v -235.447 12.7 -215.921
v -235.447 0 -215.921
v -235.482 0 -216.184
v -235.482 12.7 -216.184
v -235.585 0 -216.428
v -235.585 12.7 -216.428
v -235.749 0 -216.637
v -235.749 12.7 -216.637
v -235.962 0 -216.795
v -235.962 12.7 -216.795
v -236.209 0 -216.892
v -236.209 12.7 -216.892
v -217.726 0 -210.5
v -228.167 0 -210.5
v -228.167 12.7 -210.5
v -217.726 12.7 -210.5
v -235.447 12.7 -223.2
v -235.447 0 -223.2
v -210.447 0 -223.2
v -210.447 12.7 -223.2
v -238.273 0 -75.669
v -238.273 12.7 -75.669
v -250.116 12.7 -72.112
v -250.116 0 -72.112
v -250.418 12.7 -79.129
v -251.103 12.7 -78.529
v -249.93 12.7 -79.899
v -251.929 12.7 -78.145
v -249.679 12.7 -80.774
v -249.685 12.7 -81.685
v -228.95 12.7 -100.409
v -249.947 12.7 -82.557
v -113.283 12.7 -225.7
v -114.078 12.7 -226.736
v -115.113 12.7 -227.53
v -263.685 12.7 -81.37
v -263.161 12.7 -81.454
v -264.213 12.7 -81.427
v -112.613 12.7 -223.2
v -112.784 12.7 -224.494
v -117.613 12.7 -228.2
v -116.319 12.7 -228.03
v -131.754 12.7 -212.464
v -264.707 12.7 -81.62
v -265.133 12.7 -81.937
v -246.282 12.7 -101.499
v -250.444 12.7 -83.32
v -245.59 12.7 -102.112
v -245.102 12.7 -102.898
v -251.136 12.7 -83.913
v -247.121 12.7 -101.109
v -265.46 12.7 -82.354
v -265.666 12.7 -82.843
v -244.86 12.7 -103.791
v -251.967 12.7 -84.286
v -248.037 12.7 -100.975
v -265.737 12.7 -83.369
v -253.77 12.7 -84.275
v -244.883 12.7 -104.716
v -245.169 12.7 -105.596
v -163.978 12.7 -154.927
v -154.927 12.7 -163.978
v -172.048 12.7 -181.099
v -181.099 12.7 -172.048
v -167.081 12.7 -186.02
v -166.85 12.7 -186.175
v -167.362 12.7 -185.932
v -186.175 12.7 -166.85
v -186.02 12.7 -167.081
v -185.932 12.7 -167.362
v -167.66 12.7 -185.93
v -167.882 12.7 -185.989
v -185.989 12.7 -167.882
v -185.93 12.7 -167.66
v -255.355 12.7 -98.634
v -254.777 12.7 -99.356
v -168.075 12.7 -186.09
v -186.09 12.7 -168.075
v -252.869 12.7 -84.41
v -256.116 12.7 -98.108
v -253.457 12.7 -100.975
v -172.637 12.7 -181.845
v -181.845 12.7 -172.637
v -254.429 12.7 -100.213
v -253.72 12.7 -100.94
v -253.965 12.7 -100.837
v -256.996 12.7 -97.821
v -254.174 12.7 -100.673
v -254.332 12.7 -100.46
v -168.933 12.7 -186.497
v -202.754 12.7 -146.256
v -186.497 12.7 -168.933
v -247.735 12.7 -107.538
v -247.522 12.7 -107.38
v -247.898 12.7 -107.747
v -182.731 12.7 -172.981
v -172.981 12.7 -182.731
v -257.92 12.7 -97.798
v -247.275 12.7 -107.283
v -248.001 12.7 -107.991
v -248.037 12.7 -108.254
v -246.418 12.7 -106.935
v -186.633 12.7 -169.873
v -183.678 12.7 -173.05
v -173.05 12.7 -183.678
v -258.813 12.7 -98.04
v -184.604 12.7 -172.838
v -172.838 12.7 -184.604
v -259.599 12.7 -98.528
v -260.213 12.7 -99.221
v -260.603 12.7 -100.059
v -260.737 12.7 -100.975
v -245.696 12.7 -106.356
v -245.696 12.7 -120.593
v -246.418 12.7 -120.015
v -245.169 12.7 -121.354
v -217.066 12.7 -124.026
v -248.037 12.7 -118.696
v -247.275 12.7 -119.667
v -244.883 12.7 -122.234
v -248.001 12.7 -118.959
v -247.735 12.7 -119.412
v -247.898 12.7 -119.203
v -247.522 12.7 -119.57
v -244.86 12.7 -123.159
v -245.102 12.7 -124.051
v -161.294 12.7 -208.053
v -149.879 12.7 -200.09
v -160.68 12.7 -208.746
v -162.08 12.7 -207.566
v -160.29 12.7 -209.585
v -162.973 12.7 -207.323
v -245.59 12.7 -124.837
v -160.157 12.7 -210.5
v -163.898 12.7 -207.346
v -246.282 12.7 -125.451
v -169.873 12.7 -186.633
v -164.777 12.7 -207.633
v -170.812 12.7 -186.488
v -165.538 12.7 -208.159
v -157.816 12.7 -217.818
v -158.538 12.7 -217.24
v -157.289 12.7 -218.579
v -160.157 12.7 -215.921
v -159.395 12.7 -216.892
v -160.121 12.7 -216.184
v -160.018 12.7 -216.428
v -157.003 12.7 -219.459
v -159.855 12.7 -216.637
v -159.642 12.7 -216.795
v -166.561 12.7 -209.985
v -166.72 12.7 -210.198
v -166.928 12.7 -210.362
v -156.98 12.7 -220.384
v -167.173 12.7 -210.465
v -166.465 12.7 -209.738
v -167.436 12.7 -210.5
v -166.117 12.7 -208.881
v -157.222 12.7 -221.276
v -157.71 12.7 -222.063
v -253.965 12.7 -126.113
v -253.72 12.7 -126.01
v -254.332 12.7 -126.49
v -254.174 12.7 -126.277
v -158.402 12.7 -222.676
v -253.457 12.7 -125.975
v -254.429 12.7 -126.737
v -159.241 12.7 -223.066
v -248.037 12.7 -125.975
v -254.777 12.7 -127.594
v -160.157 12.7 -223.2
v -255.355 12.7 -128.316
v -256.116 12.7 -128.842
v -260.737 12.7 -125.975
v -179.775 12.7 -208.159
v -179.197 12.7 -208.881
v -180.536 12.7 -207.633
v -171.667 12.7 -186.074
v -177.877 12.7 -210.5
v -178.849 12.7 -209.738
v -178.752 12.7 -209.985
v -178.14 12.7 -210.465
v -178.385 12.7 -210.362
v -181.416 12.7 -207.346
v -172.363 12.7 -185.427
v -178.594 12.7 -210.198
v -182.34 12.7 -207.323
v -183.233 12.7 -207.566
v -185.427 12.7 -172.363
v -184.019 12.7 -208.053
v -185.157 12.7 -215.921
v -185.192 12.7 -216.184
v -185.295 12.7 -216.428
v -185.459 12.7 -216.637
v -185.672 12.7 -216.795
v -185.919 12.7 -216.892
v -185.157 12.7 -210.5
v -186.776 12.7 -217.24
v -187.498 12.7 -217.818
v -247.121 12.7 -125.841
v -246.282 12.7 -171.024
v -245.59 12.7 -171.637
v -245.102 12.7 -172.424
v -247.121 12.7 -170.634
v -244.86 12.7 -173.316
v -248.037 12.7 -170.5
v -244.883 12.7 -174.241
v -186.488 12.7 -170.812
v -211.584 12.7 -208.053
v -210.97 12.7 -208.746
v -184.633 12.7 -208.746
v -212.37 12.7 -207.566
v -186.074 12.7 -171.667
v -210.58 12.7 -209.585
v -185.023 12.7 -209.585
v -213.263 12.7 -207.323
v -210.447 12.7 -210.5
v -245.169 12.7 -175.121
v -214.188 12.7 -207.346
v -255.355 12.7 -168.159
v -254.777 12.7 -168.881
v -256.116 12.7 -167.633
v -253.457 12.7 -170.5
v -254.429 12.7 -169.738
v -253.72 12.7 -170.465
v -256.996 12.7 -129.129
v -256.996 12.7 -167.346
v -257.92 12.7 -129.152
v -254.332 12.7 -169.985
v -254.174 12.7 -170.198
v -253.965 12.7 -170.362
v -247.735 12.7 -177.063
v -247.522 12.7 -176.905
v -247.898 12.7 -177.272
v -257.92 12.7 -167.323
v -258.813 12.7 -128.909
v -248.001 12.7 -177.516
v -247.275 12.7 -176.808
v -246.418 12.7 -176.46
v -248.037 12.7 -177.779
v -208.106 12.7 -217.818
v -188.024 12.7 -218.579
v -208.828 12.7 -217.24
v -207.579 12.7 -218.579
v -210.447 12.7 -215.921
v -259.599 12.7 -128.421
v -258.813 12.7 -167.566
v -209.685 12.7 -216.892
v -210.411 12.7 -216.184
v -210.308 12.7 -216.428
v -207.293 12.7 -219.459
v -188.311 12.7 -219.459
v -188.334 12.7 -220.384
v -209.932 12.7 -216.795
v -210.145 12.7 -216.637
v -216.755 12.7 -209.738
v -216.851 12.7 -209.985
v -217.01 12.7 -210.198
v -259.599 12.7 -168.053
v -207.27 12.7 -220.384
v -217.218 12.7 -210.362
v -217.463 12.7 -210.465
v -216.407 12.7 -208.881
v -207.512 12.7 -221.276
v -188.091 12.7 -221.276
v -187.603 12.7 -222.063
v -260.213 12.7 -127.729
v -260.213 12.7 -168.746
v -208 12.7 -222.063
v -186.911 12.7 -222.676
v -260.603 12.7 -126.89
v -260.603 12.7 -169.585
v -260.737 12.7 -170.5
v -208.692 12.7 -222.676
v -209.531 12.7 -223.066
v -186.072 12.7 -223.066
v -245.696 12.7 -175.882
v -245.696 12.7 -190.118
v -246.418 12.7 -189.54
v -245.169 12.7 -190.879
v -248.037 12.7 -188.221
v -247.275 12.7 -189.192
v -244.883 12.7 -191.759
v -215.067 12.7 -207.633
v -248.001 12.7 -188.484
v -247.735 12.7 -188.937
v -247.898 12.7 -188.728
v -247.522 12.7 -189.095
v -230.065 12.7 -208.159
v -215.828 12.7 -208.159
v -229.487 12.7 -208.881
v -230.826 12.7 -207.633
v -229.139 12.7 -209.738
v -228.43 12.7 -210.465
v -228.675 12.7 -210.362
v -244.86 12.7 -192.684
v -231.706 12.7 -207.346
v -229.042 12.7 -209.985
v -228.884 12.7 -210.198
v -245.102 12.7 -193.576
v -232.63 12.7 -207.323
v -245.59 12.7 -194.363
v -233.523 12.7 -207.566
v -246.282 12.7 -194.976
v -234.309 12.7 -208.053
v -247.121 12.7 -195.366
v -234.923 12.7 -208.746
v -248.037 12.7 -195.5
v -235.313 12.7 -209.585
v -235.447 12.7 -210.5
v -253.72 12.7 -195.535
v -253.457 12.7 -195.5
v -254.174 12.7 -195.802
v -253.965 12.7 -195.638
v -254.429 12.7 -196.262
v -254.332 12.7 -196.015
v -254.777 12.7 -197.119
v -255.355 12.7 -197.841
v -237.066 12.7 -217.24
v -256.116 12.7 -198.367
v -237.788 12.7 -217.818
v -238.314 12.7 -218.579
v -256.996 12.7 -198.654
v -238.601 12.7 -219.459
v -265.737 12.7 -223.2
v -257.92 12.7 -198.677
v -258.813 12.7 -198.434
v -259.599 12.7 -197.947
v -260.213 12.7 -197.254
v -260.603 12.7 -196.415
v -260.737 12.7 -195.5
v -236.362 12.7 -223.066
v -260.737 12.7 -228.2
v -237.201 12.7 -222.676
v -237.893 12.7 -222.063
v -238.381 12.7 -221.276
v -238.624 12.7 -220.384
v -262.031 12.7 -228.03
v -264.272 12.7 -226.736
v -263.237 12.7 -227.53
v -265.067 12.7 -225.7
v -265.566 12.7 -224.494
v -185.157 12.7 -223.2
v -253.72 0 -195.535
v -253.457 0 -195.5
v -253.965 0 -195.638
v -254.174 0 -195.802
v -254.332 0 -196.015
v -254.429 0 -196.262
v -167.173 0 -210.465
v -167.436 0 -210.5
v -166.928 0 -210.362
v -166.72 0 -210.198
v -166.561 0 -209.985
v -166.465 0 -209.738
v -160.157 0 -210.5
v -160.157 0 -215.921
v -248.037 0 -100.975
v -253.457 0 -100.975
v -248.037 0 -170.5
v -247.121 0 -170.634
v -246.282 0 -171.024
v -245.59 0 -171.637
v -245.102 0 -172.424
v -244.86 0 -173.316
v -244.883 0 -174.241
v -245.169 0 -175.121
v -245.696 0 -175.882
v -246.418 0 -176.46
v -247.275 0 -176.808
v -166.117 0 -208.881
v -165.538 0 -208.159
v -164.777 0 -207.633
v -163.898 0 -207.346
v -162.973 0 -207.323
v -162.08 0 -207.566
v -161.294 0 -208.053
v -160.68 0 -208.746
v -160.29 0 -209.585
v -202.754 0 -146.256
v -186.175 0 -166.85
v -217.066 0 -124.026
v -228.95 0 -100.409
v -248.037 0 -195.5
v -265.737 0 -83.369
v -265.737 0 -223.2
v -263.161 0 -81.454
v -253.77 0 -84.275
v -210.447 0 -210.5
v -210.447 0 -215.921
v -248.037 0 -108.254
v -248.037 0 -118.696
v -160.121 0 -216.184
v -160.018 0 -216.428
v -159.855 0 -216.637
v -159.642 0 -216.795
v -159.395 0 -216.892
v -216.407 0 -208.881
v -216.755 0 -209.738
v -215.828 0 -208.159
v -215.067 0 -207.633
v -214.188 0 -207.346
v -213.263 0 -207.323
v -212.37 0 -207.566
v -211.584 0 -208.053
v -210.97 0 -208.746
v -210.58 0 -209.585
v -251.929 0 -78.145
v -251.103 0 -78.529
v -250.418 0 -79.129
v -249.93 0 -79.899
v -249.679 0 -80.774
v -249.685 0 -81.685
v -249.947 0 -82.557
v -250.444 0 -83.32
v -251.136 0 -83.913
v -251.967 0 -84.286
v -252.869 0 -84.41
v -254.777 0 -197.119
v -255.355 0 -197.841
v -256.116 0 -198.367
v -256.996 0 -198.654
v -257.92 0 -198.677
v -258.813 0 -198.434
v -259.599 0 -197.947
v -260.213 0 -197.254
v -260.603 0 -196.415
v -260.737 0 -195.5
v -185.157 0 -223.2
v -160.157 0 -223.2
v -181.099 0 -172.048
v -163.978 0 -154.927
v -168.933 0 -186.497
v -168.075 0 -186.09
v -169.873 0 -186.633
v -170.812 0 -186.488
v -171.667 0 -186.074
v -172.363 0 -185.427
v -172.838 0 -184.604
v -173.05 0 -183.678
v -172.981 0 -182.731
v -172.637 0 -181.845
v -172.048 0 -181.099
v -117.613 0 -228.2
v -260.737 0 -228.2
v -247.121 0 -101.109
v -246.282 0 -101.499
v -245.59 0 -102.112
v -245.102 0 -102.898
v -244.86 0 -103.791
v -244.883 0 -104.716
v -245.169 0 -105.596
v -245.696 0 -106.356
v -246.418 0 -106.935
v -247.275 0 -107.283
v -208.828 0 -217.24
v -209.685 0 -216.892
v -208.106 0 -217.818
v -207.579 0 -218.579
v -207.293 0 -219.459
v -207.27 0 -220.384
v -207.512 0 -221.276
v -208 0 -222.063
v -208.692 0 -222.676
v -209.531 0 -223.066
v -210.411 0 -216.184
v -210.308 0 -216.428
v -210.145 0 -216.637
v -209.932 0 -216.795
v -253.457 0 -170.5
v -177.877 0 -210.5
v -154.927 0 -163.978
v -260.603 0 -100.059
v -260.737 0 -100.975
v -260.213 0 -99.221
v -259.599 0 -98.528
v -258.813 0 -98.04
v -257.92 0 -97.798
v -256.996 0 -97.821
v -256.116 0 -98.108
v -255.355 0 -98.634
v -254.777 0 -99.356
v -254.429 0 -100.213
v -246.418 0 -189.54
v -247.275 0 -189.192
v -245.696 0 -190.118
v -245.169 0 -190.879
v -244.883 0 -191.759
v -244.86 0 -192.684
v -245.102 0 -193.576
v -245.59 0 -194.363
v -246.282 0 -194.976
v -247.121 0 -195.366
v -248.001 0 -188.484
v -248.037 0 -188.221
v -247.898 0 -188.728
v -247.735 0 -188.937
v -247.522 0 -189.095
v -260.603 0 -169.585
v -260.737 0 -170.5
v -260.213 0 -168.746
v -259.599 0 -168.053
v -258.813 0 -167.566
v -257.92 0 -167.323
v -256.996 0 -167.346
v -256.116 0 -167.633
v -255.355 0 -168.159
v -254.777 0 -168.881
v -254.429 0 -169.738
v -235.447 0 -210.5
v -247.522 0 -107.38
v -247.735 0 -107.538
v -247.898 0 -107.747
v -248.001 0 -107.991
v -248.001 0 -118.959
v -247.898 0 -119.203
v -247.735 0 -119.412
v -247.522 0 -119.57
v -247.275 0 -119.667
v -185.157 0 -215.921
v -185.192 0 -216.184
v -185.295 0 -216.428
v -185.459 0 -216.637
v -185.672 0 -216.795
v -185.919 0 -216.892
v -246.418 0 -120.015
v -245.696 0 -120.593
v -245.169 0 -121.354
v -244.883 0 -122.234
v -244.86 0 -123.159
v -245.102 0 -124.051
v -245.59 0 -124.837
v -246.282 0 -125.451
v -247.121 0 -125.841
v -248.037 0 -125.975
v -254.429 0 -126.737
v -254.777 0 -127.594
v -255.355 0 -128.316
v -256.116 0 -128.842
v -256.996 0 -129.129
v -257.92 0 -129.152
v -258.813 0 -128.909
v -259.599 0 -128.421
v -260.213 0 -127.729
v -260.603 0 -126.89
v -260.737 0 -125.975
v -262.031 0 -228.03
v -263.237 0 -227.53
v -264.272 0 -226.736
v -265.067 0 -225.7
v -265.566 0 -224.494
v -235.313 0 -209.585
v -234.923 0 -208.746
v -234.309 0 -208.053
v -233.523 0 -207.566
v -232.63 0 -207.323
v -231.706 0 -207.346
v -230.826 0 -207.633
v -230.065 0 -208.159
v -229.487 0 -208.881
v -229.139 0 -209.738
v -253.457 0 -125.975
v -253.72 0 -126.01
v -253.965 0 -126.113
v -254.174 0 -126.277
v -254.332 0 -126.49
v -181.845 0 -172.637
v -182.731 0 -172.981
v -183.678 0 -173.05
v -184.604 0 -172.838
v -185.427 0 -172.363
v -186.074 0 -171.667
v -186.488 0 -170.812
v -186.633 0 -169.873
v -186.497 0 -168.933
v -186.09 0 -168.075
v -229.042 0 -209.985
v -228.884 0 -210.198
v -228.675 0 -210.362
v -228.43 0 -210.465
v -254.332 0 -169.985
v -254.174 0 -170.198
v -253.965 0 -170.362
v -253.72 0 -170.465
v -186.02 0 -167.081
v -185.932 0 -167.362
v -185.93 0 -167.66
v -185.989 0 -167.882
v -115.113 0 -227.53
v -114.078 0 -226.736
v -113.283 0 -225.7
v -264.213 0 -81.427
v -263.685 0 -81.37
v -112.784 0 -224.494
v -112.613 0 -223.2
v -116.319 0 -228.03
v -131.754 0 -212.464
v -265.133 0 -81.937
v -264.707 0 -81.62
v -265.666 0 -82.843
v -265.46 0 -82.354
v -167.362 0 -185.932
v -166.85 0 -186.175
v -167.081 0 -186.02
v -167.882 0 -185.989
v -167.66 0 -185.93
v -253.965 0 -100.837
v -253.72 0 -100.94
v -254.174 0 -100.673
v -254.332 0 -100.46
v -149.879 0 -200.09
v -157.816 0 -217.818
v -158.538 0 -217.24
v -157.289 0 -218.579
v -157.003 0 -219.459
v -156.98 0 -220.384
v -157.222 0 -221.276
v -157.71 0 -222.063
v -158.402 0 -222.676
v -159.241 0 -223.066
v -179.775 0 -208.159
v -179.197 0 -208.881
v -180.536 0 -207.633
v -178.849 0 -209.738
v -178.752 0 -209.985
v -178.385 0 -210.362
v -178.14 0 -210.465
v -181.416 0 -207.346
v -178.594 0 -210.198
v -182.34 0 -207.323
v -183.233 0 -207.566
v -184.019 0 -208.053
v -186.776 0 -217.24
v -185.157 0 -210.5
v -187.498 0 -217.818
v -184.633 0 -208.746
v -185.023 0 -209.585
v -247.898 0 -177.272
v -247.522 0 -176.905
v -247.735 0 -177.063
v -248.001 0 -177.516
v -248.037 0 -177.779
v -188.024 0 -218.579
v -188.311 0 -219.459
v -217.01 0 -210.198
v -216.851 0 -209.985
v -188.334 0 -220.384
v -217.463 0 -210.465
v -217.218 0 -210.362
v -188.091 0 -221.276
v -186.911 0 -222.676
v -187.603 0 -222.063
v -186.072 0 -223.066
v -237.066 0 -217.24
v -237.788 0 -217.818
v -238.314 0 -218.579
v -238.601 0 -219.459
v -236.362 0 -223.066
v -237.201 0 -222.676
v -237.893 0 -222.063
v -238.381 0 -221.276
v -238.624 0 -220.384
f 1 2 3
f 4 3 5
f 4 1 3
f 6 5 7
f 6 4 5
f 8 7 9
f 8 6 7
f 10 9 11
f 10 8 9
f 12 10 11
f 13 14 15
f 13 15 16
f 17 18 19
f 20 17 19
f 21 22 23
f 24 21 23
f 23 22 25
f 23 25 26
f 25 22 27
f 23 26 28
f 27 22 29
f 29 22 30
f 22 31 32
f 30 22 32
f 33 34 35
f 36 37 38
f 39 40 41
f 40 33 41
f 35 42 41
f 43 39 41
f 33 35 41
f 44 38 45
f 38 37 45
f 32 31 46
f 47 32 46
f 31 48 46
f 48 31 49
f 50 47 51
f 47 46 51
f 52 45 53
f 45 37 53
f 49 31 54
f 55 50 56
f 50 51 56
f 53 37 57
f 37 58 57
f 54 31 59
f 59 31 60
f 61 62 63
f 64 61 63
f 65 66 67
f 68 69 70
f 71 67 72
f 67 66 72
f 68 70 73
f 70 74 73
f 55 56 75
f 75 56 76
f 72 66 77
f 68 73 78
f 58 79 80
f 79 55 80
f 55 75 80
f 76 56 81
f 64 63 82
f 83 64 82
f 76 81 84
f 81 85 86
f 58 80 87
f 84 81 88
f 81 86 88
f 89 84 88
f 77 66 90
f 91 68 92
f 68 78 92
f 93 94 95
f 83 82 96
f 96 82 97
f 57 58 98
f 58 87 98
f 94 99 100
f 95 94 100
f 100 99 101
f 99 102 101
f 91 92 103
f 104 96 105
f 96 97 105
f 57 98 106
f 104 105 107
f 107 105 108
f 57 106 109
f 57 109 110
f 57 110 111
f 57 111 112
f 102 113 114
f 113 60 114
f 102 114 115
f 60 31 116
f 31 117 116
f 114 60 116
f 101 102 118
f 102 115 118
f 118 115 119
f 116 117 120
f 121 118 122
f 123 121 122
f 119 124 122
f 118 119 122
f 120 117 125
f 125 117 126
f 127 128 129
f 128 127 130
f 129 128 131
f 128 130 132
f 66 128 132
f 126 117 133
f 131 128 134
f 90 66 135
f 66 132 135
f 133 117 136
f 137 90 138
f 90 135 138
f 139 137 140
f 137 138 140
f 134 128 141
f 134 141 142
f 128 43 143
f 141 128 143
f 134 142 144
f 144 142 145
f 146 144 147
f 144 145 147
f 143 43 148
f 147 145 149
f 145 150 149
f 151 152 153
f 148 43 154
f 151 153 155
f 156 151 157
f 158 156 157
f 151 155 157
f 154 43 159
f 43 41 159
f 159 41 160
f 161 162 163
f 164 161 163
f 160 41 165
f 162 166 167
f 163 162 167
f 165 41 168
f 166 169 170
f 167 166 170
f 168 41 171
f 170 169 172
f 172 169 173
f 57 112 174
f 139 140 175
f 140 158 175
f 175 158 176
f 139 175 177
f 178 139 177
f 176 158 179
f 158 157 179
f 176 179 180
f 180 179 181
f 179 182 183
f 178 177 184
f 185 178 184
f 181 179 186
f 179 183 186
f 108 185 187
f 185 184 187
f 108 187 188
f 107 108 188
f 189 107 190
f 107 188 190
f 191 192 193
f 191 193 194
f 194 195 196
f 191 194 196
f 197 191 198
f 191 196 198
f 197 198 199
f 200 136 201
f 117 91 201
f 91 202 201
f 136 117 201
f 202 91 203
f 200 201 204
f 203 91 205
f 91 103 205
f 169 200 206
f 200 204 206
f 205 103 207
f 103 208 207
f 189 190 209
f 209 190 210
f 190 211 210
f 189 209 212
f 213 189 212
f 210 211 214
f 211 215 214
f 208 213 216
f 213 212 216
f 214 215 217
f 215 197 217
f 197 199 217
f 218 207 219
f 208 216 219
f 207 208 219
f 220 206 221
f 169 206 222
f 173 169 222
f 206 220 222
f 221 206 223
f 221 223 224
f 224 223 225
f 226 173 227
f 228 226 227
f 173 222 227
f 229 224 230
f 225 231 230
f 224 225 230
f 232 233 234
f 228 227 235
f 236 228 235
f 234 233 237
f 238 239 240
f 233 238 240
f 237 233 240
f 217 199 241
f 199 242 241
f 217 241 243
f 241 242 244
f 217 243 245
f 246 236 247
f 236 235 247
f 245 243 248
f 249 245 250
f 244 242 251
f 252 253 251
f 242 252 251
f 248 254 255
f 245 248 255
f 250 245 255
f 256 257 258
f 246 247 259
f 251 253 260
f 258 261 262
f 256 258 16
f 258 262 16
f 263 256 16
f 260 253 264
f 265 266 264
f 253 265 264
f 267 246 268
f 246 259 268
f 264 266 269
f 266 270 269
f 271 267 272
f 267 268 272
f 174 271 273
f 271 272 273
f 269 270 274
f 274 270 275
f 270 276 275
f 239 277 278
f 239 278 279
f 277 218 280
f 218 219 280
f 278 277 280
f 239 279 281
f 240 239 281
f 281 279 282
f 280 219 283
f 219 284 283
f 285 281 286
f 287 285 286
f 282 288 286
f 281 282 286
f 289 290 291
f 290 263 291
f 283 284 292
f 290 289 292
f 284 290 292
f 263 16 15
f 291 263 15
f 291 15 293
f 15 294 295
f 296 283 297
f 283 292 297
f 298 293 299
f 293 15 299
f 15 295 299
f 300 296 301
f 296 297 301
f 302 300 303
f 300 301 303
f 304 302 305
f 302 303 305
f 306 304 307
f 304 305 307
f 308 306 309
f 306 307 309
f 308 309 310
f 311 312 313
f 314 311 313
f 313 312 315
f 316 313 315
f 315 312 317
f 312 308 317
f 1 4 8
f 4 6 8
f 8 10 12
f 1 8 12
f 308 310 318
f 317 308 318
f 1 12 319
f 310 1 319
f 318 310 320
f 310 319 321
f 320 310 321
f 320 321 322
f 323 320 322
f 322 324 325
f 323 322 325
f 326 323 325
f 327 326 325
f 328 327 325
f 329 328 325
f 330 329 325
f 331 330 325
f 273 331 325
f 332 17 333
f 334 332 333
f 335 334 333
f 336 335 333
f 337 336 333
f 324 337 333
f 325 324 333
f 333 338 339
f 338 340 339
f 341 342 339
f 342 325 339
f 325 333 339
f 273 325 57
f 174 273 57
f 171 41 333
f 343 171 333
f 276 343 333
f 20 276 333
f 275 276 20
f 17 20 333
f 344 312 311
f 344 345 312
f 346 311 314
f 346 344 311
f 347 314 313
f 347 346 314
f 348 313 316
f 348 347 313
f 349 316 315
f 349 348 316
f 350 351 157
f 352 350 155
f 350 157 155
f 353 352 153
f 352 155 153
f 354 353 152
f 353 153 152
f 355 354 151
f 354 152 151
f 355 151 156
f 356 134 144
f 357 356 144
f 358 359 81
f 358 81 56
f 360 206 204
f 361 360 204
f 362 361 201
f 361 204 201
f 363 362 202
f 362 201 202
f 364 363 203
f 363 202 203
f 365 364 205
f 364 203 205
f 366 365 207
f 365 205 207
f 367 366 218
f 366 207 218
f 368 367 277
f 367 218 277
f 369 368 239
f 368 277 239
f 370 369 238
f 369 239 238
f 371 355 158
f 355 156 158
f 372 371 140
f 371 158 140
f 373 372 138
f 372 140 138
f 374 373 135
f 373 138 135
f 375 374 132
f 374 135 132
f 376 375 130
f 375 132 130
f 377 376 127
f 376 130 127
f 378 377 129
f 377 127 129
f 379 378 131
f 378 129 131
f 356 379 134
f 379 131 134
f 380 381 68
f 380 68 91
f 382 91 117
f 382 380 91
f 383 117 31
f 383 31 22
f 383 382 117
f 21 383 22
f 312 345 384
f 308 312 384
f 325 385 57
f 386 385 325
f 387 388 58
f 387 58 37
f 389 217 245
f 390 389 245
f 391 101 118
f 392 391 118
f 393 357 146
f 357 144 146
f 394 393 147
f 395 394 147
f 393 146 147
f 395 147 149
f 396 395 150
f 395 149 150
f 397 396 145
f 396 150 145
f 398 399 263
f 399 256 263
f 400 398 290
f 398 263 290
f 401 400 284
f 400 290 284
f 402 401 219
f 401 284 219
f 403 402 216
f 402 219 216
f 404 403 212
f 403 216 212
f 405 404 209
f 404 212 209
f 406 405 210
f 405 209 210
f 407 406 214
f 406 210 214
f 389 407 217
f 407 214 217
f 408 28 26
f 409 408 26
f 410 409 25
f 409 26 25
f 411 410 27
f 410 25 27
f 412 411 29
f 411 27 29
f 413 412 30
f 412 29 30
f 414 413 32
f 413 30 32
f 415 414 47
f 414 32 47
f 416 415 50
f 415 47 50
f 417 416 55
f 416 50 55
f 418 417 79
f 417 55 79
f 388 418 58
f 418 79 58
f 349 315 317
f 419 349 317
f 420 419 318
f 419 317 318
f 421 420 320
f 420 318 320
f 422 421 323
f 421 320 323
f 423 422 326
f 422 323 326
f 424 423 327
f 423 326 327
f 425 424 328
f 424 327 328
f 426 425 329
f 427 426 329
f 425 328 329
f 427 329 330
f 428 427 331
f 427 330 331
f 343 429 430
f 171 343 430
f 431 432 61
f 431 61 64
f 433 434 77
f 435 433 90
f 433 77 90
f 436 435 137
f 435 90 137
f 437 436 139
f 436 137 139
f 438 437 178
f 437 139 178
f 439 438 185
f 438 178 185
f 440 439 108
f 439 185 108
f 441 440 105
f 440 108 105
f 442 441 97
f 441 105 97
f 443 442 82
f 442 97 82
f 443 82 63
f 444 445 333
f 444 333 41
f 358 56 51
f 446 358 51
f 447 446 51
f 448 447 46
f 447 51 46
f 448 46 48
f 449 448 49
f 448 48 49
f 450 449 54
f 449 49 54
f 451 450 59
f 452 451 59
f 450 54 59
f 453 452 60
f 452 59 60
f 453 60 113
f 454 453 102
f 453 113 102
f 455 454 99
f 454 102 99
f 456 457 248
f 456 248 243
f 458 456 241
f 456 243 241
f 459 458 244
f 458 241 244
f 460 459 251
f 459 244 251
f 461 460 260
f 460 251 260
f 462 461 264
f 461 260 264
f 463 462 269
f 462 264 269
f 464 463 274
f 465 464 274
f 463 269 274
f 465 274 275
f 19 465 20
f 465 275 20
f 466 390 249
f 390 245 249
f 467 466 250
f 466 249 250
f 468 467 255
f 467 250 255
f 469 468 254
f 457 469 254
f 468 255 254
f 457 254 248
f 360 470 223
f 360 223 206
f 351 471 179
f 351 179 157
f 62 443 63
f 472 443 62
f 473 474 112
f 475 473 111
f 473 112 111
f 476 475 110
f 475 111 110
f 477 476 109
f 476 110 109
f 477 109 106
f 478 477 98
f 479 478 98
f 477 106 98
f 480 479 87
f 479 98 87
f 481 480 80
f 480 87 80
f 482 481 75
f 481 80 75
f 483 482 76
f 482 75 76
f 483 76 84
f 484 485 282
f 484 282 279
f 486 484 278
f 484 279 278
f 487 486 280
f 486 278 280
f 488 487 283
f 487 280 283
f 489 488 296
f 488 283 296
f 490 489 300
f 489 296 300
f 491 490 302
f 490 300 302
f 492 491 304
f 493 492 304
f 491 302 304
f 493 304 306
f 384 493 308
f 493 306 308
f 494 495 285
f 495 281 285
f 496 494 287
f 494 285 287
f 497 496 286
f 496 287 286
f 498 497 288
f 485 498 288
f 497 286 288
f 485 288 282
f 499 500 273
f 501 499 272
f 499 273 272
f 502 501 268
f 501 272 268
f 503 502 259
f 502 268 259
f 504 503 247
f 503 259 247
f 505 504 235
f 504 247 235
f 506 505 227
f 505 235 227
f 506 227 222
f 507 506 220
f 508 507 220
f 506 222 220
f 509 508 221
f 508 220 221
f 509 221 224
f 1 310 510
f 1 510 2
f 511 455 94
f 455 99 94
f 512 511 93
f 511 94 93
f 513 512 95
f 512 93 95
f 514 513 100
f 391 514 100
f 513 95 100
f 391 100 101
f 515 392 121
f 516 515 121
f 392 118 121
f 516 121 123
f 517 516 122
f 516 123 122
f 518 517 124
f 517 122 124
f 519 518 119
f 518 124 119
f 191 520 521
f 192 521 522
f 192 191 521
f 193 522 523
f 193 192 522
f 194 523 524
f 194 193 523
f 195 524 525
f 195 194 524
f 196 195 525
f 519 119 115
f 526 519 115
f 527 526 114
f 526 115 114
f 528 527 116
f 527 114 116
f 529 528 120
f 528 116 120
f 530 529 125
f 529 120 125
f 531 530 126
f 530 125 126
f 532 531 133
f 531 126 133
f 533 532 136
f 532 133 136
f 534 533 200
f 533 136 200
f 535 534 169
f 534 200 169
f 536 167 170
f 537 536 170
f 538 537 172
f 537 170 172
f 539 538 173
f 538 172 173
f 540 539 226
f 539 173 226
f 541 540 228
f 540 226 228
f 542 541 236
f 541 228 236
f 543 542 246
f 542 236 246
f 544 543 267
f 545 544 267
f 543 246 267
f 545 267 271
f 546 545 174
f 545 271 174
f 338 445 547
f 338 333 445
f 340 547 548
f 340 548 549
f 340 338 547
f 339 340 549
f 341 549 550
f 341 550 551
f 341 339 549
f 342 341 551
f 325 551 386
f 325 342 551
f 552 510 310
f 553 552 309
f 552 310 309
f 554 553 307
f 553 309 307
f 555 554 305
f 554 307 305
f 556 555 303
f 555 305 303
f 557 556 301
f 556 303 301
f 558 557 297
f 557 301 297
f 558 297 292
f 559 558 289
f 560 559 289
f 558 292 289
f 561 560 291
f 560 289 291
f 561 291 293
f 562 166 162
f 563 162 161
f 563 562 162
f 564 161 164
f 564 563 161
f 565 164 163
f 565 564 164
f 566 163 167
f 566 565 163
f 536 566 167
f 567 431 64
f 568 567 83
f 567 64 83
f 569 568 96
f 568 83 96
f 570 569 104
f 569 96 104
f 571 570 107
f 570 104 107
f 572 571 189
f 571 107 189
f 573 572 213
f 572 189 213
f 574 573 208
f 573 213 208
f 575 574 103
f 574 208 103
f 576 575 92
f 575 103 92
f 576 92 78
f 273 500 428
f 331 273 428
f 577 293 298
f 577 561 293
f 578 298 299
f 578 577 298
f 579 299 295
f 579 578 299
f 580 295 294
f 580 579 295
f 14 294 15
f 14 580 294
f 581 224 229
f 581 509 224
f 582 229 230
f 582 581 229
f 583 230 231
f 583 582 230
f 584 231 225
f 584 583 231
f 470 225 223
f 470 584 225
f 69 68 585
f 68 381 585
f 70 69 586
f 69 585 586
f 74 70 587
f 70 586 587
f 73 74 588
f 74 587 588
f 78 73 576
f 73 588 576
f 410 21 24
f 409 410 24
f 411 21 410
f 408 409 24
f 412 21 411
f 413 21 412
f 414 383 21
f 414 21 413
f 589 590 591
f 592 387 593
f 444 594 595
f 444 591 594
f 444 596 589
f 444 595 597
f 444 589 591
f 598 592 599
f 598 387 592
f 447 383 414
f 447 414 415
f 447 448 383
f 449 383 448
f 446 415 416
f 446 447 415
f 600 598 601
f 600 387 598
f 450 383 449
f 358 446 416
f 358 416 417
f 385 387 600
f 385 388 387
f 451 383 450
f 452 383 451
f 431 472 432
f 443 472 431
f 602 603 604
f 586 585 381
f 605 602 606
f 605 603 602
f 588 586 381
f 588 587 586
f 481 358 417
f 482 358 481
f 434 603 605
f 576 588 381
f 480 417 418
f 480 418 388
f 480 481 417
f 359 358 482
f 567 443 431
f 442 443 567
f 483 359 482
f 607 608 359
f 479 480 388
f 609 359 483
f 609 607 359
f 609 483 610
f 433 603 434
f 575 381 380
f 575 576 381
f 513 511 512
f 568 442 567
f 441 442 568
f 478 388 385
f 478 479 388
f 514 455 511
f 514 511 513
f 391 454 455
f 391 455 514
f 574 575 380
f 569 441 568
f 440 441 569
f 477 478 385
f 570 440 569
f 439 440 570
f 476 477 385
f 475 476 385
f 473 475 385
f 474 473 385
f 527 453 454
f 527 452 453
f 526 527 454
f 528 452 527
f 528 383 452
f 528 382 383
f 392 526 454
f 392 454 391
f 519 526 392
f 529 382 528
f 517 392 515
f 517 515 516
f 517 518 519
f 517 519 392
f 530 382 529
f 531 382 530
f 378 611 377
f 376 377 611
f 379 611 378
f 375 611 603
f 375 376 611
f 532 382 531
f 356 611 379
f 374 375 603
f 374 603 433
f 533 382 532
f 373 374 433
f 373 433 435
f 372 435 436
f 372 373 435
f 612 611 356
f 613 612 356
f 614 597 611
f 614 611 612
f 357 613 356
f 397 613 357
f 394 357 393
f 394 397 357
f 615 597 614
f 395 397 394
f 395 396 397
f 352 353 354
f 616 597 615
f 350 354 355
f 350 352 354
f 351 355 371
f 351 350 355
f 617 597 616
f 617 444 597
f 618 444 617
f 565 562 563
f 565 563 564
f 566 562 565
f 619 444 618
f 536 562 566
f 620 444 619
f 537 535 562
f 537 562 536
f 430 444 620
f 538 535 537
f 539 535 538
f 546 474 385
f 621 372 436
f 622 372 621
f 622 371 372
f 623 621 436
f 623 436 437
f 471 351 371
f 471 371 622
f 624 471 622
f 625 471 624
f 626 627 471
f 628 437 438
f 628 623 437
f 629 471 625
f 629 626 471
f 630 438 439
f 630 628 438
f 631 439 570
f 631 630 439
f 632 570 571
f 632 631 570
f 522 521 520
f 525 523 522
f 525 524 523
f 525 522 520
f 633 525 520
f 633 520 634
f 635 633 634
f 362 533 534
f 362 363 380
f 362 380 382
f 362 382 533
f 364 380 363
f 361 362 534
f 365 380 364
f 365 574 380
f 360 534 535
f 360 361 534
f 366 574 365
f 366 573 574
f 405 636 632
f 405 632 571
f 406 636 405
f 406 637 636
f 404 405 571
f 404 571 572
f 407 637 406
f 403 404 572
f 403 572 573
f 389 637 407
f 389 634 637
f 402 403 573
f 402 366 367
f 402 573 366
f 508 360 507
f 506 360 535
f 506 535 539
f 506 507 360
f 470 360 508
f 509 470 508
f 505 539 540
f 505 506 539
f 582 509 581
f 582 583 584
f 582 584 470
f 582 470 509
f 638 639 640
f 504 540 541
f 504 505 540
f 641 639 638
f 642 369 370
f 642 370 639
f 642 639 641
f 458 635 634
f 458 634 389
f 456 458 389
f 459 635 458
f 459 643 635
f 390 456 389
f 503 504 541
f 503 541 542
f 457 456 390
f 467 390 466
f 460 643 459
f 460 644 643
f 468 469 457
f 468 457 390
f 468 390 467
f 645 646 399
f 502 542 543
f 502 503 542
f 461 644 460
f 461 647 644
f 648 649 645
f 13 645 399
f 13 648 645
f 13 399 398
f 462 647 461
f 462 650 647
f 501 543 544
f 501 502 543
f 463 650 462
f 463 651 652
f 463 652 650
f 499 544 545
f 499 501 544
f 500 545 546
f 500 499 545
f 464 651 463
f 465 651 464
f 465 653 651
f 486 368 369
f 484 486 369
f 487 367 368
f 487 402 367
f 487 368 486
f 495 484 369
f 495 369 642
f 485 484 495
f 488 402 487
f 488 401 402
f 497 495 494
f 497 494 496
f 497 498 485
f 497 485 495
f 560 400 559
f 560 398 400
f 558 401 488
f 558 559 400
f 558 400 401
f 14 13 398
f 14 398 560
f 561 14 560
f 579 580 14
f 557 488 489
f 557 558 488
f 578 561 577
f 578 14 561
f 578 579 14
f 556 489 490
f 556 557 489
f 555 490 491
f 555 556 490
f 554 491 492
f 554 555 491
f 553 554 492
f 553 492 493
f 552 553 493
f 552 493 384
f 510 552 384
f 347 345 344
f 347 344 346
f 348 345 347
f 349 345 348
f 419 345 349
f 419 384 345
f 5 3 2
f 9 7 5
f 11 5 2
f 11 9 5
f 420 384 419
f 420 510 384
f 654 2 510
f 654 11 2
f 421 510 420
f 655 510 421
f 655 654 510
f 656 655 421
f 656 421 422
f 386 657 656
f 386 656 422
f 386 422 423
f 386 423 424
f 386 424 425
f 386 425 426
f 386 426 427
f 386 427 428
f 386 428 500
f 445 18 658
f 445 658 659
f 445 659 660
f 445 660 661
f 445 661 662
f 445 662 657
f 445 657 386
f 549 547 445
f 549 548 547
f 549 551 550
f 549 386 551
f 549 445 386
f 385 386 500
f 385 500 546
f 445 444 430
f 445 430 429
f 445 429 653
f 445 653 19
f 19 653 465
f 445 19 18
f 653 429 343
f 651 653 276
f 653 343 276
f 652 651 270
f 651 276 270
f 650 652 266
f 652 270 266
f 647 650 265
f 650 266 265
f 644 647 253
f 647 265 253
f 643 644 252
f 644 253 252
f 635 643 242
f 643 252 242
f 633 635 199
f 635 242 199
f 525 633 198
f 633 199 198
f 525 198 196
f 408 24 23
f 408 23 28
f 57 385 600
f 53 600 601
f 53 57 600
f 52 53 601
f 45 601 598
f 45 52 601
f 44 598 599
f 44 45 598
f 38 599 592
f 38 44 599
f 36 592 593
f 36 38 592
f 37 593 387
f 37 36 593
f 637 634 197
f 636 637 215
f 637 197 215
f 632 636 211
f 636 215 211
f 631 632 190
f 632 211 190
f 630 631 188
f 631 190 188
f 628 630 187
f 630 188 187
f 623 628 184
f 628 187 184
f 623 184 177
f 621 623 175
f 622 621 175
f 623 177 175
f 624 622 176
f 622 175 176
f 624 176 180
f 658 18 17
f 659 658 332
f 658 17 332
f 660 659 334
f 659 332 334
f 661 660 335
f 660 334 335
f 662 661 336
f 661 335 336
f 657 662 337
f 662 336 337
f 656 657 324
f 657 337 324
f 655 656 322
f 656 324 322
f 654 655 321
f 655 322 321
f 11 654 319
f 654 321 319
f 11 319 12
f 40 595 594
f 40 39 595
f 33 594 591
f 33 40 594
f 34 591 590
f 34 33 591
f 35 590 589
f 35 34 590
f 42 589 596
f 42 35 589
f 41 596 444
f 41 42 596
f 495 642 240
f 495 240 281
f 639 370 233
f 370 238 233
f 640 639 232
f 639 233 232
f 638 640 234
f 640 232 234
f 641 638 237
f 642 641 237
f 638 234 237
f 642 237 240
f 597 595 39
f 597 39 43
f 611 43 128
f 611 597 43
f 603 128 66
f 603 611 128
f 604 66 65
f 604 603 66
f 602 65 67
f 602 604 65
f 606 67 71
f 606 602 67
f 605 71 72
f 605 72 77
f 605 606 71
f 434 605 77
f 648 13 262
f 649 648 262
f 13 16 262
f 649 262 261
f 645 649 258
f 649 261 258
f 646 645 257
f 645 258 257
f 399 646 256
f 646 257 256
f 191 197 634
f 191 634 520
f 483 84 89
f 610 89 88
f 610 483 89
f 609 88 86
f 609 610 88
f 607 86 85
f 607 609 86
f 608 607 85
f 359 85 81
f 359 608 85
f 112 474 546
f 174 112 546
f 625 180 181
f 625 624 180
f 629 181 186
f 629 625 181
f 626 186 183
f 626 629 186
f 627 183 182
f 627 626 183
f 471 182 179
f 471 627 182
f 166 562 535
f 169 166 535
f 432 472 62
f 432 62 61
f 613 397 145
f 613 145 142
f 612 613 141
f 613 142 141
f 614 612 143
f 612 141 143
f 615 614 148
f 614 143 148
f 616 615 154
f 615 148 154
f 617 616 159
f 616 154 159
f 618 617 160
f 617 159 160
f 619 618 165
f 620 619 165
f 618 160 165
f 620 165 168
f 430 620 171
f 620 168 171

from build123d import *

# Parameters (mm, degrees)
SKETCH1_W           = 25
SKETCH1_H           = 12.7
SKETCH1_W_2         = 12.7
SKETCH1_H_2         = 25
BOSS_EXTRUDE1_DEPTH = 12.7
SKETCH2_R           = 3.2
CUT_EXTRUDE1_DEPTH  = 351.503213473
FILLET1_R           = 5
FILLET2_R           = 1
FILLET3_R           = 2


with BuildPart() as part:
    # Sketch1 → Boss-Extrude1 (new body)
    with BuildSketch(Plane(origin=(0, 0, 0), x_dir=(1, 0, 0), z_dir=(0, 1, 0))):
        with BuildLine():
            Line((-172.193276216, 181.244243015), (-154.927095758, 163.978062557))
            Line((-154.927095758, 163.978062557), (-163.978062557, 154.927095758))
            Line((-163.978062557, 154.927095758), (-181.244243015, 172.193276216))
            ThreePointArc((-181.244243015, 172.193276216), (-215.239427447, 127.169134904), (-238.273429132, 75.668837508))
            Line((-238.273429132, 75.668837508), (-250.116468804, 72.111522519))
            Line((-250.116468804, 72.111522519), (-253.769935453, 84.27467102))
            Line((-253.769935453, 84.27467102), (-265.736660352, 80.680204478))
            Line((-265.736660352, 80.680204478), (-265.736660352, 228.2))
            Line((-265.736660352, 228.2), (-112.613320704, 228.2))
            Line((-112.613320704, 228.2), (-112.613320704, 223.2))
            ThreePointArc((-112.613320704, 223.2), (-143.940163951, 204.40457236), (-172.193276216, 181.244243015))
        make_face()
        with Locations((-172.656660352, 216.85)):
            Rectangle(SKETCH1_W, SKETCH1_H, mode=Mode.SUBTRACT)
        with Locations((-222.946660352, 216.85)):
            Rectangle(SKETCH1_W, SKETCH1_H, mode=Mode.SUBTRACT)
        with Locations((-254.386660352, 183)):
            Rectangle(SKETCH1_W_2, SKETCH1_H_2, mode=Mode.SUBTRACT)
        with Locations((-254.386660352, 113.474827547)):
            Rectangle(SKETCH1_W_2, SKETCH1_H_2, mode=Mode.SUBTRACT)
    extrude(amount=BOSS_EXTRUDE1_DEPTH)

    # Sketch2 → Cut-Extrude1 (cut, through all)
    with BuildSketch(Plane(origin=(0, 12.7, 0), x_dir=(1, 0, 0), z_dir=(0, 1, 0))):
        with Locations((-169.859291345, 183.433424282)):
            Circle(SKETCH2_R)
        with Locations((-183.433424282, 169.859291345)):
            Circle(SKETCH2_R)
        with Locations((-181.956660352, 210.5)):
            Circle(SKETCH2_R)
        with Locations((-163.356660352, 210.5)):
            Circle(SKETCH2_R)
        with Locations((-160.156660352, 220)):
            Circle(SKETCH2_R)
        with Locations((-185.156660352, 220)):
            Circle(SKETCH2_R)
        with Locations((-210.446660352, 220)):
            Circle(SKETCH2_R)
        with Locations((-213.646660352, 210.5)):
            Circle(SKETCH2_R)
        with Locations((-232.246660352, 210.5)):
            Circle(SKETCH2_R)
        with Locations((-235.446660352, 220)):
            Circle(SKETCH2_R)
        with Locations((-257.536660352, 195.5)):
            Circle(SKETCH2_R)
        with Locations((-248.036660352, 192.3)):
            Circle(SKETCH2_R)
        with Locations((-248.036660352, 173.7)):
            Circle(SKETCH2_R)
        with Locations((-257.536660352, 170.5)):
            Circle(SKETCH2_R)
        with Locations((-257.536660352, 125.974827547)):
            Circle(SKETCH2_R)
        with Locations((-257.536660352, 100.974827547)):
            Circle(SKETCH2_R)
        with Locations((-248.036660352, 104.174827547)):
            Circle(SKETCH2_R)
        with Locations((-248.036660352, 122.774827547)):
            Circle(SKETCH2_R)
        with Locations((-252.849376927, 81.209940689)):
            Circle(SKETCH2_R)
    extrude(amount=-CUT_EXTRUDE1_DEPTH, mode=Mode.SUBTRACT)

    # Fillet1
    fillet1_edges = [part.edges().sort_by_distance(p)[0] for p in [
        (-112.613320704, 6.35, -228.2),
        (-265.736660352, 6.35, -228.2),
    ]]
    fillet(fillet1_edges, radius=FILLET1_R - 0.0001)  # a hair under: the kernel refuses the full size

    # Fillet2
    fillet2_edges = [part.edges().sort_by_distance(p)[0] for p in [
        (-167.497476727, 6.35, -185.592551817),
        (-185.592551817, 6.35, -167.497476727),
        (-248.036660352, 6.35, -107.374827547),
        (-254.336660352, 6.35, -100.974827547),
        (-254.336660352, 6.35, -125.974827547),
        (-248.036660352, 6.35, -119.574827547),
        (-216.846660352, 6.35, -210.5),
        (-229.046660352, 6.35, -210.5),
        (-235.446660352, 6.35, -216.8),
        (-160.156660352, 6.35, -216.8),
        (-166.556660352, 6.35, -210.5),
        (-178.756660352, 6.35, -210.5),
        (-185.156660352, 6.35, -216.8),
        (-210.446660352, 6.35, -216.8),
        (-248.036660352, 6.35, -189.1),
        (-248.036660352, 6.35, -176.9),
        (-254.336660352, 6.35, -170.5),
        (-254.336660352, 6.35, -195.5),
    ]]
    fillet(fillet2_edges, radius=FILLET2_R)

    # Fillet3
    fillet3_edges = [part.edges().sort_by_distance(p)[0] for p in [
        (-265.736660352, 6.35, -80.680204478),
    ]]
    fillet(fillet3_edges, radius=FILLET3_R)


solid = part.part
